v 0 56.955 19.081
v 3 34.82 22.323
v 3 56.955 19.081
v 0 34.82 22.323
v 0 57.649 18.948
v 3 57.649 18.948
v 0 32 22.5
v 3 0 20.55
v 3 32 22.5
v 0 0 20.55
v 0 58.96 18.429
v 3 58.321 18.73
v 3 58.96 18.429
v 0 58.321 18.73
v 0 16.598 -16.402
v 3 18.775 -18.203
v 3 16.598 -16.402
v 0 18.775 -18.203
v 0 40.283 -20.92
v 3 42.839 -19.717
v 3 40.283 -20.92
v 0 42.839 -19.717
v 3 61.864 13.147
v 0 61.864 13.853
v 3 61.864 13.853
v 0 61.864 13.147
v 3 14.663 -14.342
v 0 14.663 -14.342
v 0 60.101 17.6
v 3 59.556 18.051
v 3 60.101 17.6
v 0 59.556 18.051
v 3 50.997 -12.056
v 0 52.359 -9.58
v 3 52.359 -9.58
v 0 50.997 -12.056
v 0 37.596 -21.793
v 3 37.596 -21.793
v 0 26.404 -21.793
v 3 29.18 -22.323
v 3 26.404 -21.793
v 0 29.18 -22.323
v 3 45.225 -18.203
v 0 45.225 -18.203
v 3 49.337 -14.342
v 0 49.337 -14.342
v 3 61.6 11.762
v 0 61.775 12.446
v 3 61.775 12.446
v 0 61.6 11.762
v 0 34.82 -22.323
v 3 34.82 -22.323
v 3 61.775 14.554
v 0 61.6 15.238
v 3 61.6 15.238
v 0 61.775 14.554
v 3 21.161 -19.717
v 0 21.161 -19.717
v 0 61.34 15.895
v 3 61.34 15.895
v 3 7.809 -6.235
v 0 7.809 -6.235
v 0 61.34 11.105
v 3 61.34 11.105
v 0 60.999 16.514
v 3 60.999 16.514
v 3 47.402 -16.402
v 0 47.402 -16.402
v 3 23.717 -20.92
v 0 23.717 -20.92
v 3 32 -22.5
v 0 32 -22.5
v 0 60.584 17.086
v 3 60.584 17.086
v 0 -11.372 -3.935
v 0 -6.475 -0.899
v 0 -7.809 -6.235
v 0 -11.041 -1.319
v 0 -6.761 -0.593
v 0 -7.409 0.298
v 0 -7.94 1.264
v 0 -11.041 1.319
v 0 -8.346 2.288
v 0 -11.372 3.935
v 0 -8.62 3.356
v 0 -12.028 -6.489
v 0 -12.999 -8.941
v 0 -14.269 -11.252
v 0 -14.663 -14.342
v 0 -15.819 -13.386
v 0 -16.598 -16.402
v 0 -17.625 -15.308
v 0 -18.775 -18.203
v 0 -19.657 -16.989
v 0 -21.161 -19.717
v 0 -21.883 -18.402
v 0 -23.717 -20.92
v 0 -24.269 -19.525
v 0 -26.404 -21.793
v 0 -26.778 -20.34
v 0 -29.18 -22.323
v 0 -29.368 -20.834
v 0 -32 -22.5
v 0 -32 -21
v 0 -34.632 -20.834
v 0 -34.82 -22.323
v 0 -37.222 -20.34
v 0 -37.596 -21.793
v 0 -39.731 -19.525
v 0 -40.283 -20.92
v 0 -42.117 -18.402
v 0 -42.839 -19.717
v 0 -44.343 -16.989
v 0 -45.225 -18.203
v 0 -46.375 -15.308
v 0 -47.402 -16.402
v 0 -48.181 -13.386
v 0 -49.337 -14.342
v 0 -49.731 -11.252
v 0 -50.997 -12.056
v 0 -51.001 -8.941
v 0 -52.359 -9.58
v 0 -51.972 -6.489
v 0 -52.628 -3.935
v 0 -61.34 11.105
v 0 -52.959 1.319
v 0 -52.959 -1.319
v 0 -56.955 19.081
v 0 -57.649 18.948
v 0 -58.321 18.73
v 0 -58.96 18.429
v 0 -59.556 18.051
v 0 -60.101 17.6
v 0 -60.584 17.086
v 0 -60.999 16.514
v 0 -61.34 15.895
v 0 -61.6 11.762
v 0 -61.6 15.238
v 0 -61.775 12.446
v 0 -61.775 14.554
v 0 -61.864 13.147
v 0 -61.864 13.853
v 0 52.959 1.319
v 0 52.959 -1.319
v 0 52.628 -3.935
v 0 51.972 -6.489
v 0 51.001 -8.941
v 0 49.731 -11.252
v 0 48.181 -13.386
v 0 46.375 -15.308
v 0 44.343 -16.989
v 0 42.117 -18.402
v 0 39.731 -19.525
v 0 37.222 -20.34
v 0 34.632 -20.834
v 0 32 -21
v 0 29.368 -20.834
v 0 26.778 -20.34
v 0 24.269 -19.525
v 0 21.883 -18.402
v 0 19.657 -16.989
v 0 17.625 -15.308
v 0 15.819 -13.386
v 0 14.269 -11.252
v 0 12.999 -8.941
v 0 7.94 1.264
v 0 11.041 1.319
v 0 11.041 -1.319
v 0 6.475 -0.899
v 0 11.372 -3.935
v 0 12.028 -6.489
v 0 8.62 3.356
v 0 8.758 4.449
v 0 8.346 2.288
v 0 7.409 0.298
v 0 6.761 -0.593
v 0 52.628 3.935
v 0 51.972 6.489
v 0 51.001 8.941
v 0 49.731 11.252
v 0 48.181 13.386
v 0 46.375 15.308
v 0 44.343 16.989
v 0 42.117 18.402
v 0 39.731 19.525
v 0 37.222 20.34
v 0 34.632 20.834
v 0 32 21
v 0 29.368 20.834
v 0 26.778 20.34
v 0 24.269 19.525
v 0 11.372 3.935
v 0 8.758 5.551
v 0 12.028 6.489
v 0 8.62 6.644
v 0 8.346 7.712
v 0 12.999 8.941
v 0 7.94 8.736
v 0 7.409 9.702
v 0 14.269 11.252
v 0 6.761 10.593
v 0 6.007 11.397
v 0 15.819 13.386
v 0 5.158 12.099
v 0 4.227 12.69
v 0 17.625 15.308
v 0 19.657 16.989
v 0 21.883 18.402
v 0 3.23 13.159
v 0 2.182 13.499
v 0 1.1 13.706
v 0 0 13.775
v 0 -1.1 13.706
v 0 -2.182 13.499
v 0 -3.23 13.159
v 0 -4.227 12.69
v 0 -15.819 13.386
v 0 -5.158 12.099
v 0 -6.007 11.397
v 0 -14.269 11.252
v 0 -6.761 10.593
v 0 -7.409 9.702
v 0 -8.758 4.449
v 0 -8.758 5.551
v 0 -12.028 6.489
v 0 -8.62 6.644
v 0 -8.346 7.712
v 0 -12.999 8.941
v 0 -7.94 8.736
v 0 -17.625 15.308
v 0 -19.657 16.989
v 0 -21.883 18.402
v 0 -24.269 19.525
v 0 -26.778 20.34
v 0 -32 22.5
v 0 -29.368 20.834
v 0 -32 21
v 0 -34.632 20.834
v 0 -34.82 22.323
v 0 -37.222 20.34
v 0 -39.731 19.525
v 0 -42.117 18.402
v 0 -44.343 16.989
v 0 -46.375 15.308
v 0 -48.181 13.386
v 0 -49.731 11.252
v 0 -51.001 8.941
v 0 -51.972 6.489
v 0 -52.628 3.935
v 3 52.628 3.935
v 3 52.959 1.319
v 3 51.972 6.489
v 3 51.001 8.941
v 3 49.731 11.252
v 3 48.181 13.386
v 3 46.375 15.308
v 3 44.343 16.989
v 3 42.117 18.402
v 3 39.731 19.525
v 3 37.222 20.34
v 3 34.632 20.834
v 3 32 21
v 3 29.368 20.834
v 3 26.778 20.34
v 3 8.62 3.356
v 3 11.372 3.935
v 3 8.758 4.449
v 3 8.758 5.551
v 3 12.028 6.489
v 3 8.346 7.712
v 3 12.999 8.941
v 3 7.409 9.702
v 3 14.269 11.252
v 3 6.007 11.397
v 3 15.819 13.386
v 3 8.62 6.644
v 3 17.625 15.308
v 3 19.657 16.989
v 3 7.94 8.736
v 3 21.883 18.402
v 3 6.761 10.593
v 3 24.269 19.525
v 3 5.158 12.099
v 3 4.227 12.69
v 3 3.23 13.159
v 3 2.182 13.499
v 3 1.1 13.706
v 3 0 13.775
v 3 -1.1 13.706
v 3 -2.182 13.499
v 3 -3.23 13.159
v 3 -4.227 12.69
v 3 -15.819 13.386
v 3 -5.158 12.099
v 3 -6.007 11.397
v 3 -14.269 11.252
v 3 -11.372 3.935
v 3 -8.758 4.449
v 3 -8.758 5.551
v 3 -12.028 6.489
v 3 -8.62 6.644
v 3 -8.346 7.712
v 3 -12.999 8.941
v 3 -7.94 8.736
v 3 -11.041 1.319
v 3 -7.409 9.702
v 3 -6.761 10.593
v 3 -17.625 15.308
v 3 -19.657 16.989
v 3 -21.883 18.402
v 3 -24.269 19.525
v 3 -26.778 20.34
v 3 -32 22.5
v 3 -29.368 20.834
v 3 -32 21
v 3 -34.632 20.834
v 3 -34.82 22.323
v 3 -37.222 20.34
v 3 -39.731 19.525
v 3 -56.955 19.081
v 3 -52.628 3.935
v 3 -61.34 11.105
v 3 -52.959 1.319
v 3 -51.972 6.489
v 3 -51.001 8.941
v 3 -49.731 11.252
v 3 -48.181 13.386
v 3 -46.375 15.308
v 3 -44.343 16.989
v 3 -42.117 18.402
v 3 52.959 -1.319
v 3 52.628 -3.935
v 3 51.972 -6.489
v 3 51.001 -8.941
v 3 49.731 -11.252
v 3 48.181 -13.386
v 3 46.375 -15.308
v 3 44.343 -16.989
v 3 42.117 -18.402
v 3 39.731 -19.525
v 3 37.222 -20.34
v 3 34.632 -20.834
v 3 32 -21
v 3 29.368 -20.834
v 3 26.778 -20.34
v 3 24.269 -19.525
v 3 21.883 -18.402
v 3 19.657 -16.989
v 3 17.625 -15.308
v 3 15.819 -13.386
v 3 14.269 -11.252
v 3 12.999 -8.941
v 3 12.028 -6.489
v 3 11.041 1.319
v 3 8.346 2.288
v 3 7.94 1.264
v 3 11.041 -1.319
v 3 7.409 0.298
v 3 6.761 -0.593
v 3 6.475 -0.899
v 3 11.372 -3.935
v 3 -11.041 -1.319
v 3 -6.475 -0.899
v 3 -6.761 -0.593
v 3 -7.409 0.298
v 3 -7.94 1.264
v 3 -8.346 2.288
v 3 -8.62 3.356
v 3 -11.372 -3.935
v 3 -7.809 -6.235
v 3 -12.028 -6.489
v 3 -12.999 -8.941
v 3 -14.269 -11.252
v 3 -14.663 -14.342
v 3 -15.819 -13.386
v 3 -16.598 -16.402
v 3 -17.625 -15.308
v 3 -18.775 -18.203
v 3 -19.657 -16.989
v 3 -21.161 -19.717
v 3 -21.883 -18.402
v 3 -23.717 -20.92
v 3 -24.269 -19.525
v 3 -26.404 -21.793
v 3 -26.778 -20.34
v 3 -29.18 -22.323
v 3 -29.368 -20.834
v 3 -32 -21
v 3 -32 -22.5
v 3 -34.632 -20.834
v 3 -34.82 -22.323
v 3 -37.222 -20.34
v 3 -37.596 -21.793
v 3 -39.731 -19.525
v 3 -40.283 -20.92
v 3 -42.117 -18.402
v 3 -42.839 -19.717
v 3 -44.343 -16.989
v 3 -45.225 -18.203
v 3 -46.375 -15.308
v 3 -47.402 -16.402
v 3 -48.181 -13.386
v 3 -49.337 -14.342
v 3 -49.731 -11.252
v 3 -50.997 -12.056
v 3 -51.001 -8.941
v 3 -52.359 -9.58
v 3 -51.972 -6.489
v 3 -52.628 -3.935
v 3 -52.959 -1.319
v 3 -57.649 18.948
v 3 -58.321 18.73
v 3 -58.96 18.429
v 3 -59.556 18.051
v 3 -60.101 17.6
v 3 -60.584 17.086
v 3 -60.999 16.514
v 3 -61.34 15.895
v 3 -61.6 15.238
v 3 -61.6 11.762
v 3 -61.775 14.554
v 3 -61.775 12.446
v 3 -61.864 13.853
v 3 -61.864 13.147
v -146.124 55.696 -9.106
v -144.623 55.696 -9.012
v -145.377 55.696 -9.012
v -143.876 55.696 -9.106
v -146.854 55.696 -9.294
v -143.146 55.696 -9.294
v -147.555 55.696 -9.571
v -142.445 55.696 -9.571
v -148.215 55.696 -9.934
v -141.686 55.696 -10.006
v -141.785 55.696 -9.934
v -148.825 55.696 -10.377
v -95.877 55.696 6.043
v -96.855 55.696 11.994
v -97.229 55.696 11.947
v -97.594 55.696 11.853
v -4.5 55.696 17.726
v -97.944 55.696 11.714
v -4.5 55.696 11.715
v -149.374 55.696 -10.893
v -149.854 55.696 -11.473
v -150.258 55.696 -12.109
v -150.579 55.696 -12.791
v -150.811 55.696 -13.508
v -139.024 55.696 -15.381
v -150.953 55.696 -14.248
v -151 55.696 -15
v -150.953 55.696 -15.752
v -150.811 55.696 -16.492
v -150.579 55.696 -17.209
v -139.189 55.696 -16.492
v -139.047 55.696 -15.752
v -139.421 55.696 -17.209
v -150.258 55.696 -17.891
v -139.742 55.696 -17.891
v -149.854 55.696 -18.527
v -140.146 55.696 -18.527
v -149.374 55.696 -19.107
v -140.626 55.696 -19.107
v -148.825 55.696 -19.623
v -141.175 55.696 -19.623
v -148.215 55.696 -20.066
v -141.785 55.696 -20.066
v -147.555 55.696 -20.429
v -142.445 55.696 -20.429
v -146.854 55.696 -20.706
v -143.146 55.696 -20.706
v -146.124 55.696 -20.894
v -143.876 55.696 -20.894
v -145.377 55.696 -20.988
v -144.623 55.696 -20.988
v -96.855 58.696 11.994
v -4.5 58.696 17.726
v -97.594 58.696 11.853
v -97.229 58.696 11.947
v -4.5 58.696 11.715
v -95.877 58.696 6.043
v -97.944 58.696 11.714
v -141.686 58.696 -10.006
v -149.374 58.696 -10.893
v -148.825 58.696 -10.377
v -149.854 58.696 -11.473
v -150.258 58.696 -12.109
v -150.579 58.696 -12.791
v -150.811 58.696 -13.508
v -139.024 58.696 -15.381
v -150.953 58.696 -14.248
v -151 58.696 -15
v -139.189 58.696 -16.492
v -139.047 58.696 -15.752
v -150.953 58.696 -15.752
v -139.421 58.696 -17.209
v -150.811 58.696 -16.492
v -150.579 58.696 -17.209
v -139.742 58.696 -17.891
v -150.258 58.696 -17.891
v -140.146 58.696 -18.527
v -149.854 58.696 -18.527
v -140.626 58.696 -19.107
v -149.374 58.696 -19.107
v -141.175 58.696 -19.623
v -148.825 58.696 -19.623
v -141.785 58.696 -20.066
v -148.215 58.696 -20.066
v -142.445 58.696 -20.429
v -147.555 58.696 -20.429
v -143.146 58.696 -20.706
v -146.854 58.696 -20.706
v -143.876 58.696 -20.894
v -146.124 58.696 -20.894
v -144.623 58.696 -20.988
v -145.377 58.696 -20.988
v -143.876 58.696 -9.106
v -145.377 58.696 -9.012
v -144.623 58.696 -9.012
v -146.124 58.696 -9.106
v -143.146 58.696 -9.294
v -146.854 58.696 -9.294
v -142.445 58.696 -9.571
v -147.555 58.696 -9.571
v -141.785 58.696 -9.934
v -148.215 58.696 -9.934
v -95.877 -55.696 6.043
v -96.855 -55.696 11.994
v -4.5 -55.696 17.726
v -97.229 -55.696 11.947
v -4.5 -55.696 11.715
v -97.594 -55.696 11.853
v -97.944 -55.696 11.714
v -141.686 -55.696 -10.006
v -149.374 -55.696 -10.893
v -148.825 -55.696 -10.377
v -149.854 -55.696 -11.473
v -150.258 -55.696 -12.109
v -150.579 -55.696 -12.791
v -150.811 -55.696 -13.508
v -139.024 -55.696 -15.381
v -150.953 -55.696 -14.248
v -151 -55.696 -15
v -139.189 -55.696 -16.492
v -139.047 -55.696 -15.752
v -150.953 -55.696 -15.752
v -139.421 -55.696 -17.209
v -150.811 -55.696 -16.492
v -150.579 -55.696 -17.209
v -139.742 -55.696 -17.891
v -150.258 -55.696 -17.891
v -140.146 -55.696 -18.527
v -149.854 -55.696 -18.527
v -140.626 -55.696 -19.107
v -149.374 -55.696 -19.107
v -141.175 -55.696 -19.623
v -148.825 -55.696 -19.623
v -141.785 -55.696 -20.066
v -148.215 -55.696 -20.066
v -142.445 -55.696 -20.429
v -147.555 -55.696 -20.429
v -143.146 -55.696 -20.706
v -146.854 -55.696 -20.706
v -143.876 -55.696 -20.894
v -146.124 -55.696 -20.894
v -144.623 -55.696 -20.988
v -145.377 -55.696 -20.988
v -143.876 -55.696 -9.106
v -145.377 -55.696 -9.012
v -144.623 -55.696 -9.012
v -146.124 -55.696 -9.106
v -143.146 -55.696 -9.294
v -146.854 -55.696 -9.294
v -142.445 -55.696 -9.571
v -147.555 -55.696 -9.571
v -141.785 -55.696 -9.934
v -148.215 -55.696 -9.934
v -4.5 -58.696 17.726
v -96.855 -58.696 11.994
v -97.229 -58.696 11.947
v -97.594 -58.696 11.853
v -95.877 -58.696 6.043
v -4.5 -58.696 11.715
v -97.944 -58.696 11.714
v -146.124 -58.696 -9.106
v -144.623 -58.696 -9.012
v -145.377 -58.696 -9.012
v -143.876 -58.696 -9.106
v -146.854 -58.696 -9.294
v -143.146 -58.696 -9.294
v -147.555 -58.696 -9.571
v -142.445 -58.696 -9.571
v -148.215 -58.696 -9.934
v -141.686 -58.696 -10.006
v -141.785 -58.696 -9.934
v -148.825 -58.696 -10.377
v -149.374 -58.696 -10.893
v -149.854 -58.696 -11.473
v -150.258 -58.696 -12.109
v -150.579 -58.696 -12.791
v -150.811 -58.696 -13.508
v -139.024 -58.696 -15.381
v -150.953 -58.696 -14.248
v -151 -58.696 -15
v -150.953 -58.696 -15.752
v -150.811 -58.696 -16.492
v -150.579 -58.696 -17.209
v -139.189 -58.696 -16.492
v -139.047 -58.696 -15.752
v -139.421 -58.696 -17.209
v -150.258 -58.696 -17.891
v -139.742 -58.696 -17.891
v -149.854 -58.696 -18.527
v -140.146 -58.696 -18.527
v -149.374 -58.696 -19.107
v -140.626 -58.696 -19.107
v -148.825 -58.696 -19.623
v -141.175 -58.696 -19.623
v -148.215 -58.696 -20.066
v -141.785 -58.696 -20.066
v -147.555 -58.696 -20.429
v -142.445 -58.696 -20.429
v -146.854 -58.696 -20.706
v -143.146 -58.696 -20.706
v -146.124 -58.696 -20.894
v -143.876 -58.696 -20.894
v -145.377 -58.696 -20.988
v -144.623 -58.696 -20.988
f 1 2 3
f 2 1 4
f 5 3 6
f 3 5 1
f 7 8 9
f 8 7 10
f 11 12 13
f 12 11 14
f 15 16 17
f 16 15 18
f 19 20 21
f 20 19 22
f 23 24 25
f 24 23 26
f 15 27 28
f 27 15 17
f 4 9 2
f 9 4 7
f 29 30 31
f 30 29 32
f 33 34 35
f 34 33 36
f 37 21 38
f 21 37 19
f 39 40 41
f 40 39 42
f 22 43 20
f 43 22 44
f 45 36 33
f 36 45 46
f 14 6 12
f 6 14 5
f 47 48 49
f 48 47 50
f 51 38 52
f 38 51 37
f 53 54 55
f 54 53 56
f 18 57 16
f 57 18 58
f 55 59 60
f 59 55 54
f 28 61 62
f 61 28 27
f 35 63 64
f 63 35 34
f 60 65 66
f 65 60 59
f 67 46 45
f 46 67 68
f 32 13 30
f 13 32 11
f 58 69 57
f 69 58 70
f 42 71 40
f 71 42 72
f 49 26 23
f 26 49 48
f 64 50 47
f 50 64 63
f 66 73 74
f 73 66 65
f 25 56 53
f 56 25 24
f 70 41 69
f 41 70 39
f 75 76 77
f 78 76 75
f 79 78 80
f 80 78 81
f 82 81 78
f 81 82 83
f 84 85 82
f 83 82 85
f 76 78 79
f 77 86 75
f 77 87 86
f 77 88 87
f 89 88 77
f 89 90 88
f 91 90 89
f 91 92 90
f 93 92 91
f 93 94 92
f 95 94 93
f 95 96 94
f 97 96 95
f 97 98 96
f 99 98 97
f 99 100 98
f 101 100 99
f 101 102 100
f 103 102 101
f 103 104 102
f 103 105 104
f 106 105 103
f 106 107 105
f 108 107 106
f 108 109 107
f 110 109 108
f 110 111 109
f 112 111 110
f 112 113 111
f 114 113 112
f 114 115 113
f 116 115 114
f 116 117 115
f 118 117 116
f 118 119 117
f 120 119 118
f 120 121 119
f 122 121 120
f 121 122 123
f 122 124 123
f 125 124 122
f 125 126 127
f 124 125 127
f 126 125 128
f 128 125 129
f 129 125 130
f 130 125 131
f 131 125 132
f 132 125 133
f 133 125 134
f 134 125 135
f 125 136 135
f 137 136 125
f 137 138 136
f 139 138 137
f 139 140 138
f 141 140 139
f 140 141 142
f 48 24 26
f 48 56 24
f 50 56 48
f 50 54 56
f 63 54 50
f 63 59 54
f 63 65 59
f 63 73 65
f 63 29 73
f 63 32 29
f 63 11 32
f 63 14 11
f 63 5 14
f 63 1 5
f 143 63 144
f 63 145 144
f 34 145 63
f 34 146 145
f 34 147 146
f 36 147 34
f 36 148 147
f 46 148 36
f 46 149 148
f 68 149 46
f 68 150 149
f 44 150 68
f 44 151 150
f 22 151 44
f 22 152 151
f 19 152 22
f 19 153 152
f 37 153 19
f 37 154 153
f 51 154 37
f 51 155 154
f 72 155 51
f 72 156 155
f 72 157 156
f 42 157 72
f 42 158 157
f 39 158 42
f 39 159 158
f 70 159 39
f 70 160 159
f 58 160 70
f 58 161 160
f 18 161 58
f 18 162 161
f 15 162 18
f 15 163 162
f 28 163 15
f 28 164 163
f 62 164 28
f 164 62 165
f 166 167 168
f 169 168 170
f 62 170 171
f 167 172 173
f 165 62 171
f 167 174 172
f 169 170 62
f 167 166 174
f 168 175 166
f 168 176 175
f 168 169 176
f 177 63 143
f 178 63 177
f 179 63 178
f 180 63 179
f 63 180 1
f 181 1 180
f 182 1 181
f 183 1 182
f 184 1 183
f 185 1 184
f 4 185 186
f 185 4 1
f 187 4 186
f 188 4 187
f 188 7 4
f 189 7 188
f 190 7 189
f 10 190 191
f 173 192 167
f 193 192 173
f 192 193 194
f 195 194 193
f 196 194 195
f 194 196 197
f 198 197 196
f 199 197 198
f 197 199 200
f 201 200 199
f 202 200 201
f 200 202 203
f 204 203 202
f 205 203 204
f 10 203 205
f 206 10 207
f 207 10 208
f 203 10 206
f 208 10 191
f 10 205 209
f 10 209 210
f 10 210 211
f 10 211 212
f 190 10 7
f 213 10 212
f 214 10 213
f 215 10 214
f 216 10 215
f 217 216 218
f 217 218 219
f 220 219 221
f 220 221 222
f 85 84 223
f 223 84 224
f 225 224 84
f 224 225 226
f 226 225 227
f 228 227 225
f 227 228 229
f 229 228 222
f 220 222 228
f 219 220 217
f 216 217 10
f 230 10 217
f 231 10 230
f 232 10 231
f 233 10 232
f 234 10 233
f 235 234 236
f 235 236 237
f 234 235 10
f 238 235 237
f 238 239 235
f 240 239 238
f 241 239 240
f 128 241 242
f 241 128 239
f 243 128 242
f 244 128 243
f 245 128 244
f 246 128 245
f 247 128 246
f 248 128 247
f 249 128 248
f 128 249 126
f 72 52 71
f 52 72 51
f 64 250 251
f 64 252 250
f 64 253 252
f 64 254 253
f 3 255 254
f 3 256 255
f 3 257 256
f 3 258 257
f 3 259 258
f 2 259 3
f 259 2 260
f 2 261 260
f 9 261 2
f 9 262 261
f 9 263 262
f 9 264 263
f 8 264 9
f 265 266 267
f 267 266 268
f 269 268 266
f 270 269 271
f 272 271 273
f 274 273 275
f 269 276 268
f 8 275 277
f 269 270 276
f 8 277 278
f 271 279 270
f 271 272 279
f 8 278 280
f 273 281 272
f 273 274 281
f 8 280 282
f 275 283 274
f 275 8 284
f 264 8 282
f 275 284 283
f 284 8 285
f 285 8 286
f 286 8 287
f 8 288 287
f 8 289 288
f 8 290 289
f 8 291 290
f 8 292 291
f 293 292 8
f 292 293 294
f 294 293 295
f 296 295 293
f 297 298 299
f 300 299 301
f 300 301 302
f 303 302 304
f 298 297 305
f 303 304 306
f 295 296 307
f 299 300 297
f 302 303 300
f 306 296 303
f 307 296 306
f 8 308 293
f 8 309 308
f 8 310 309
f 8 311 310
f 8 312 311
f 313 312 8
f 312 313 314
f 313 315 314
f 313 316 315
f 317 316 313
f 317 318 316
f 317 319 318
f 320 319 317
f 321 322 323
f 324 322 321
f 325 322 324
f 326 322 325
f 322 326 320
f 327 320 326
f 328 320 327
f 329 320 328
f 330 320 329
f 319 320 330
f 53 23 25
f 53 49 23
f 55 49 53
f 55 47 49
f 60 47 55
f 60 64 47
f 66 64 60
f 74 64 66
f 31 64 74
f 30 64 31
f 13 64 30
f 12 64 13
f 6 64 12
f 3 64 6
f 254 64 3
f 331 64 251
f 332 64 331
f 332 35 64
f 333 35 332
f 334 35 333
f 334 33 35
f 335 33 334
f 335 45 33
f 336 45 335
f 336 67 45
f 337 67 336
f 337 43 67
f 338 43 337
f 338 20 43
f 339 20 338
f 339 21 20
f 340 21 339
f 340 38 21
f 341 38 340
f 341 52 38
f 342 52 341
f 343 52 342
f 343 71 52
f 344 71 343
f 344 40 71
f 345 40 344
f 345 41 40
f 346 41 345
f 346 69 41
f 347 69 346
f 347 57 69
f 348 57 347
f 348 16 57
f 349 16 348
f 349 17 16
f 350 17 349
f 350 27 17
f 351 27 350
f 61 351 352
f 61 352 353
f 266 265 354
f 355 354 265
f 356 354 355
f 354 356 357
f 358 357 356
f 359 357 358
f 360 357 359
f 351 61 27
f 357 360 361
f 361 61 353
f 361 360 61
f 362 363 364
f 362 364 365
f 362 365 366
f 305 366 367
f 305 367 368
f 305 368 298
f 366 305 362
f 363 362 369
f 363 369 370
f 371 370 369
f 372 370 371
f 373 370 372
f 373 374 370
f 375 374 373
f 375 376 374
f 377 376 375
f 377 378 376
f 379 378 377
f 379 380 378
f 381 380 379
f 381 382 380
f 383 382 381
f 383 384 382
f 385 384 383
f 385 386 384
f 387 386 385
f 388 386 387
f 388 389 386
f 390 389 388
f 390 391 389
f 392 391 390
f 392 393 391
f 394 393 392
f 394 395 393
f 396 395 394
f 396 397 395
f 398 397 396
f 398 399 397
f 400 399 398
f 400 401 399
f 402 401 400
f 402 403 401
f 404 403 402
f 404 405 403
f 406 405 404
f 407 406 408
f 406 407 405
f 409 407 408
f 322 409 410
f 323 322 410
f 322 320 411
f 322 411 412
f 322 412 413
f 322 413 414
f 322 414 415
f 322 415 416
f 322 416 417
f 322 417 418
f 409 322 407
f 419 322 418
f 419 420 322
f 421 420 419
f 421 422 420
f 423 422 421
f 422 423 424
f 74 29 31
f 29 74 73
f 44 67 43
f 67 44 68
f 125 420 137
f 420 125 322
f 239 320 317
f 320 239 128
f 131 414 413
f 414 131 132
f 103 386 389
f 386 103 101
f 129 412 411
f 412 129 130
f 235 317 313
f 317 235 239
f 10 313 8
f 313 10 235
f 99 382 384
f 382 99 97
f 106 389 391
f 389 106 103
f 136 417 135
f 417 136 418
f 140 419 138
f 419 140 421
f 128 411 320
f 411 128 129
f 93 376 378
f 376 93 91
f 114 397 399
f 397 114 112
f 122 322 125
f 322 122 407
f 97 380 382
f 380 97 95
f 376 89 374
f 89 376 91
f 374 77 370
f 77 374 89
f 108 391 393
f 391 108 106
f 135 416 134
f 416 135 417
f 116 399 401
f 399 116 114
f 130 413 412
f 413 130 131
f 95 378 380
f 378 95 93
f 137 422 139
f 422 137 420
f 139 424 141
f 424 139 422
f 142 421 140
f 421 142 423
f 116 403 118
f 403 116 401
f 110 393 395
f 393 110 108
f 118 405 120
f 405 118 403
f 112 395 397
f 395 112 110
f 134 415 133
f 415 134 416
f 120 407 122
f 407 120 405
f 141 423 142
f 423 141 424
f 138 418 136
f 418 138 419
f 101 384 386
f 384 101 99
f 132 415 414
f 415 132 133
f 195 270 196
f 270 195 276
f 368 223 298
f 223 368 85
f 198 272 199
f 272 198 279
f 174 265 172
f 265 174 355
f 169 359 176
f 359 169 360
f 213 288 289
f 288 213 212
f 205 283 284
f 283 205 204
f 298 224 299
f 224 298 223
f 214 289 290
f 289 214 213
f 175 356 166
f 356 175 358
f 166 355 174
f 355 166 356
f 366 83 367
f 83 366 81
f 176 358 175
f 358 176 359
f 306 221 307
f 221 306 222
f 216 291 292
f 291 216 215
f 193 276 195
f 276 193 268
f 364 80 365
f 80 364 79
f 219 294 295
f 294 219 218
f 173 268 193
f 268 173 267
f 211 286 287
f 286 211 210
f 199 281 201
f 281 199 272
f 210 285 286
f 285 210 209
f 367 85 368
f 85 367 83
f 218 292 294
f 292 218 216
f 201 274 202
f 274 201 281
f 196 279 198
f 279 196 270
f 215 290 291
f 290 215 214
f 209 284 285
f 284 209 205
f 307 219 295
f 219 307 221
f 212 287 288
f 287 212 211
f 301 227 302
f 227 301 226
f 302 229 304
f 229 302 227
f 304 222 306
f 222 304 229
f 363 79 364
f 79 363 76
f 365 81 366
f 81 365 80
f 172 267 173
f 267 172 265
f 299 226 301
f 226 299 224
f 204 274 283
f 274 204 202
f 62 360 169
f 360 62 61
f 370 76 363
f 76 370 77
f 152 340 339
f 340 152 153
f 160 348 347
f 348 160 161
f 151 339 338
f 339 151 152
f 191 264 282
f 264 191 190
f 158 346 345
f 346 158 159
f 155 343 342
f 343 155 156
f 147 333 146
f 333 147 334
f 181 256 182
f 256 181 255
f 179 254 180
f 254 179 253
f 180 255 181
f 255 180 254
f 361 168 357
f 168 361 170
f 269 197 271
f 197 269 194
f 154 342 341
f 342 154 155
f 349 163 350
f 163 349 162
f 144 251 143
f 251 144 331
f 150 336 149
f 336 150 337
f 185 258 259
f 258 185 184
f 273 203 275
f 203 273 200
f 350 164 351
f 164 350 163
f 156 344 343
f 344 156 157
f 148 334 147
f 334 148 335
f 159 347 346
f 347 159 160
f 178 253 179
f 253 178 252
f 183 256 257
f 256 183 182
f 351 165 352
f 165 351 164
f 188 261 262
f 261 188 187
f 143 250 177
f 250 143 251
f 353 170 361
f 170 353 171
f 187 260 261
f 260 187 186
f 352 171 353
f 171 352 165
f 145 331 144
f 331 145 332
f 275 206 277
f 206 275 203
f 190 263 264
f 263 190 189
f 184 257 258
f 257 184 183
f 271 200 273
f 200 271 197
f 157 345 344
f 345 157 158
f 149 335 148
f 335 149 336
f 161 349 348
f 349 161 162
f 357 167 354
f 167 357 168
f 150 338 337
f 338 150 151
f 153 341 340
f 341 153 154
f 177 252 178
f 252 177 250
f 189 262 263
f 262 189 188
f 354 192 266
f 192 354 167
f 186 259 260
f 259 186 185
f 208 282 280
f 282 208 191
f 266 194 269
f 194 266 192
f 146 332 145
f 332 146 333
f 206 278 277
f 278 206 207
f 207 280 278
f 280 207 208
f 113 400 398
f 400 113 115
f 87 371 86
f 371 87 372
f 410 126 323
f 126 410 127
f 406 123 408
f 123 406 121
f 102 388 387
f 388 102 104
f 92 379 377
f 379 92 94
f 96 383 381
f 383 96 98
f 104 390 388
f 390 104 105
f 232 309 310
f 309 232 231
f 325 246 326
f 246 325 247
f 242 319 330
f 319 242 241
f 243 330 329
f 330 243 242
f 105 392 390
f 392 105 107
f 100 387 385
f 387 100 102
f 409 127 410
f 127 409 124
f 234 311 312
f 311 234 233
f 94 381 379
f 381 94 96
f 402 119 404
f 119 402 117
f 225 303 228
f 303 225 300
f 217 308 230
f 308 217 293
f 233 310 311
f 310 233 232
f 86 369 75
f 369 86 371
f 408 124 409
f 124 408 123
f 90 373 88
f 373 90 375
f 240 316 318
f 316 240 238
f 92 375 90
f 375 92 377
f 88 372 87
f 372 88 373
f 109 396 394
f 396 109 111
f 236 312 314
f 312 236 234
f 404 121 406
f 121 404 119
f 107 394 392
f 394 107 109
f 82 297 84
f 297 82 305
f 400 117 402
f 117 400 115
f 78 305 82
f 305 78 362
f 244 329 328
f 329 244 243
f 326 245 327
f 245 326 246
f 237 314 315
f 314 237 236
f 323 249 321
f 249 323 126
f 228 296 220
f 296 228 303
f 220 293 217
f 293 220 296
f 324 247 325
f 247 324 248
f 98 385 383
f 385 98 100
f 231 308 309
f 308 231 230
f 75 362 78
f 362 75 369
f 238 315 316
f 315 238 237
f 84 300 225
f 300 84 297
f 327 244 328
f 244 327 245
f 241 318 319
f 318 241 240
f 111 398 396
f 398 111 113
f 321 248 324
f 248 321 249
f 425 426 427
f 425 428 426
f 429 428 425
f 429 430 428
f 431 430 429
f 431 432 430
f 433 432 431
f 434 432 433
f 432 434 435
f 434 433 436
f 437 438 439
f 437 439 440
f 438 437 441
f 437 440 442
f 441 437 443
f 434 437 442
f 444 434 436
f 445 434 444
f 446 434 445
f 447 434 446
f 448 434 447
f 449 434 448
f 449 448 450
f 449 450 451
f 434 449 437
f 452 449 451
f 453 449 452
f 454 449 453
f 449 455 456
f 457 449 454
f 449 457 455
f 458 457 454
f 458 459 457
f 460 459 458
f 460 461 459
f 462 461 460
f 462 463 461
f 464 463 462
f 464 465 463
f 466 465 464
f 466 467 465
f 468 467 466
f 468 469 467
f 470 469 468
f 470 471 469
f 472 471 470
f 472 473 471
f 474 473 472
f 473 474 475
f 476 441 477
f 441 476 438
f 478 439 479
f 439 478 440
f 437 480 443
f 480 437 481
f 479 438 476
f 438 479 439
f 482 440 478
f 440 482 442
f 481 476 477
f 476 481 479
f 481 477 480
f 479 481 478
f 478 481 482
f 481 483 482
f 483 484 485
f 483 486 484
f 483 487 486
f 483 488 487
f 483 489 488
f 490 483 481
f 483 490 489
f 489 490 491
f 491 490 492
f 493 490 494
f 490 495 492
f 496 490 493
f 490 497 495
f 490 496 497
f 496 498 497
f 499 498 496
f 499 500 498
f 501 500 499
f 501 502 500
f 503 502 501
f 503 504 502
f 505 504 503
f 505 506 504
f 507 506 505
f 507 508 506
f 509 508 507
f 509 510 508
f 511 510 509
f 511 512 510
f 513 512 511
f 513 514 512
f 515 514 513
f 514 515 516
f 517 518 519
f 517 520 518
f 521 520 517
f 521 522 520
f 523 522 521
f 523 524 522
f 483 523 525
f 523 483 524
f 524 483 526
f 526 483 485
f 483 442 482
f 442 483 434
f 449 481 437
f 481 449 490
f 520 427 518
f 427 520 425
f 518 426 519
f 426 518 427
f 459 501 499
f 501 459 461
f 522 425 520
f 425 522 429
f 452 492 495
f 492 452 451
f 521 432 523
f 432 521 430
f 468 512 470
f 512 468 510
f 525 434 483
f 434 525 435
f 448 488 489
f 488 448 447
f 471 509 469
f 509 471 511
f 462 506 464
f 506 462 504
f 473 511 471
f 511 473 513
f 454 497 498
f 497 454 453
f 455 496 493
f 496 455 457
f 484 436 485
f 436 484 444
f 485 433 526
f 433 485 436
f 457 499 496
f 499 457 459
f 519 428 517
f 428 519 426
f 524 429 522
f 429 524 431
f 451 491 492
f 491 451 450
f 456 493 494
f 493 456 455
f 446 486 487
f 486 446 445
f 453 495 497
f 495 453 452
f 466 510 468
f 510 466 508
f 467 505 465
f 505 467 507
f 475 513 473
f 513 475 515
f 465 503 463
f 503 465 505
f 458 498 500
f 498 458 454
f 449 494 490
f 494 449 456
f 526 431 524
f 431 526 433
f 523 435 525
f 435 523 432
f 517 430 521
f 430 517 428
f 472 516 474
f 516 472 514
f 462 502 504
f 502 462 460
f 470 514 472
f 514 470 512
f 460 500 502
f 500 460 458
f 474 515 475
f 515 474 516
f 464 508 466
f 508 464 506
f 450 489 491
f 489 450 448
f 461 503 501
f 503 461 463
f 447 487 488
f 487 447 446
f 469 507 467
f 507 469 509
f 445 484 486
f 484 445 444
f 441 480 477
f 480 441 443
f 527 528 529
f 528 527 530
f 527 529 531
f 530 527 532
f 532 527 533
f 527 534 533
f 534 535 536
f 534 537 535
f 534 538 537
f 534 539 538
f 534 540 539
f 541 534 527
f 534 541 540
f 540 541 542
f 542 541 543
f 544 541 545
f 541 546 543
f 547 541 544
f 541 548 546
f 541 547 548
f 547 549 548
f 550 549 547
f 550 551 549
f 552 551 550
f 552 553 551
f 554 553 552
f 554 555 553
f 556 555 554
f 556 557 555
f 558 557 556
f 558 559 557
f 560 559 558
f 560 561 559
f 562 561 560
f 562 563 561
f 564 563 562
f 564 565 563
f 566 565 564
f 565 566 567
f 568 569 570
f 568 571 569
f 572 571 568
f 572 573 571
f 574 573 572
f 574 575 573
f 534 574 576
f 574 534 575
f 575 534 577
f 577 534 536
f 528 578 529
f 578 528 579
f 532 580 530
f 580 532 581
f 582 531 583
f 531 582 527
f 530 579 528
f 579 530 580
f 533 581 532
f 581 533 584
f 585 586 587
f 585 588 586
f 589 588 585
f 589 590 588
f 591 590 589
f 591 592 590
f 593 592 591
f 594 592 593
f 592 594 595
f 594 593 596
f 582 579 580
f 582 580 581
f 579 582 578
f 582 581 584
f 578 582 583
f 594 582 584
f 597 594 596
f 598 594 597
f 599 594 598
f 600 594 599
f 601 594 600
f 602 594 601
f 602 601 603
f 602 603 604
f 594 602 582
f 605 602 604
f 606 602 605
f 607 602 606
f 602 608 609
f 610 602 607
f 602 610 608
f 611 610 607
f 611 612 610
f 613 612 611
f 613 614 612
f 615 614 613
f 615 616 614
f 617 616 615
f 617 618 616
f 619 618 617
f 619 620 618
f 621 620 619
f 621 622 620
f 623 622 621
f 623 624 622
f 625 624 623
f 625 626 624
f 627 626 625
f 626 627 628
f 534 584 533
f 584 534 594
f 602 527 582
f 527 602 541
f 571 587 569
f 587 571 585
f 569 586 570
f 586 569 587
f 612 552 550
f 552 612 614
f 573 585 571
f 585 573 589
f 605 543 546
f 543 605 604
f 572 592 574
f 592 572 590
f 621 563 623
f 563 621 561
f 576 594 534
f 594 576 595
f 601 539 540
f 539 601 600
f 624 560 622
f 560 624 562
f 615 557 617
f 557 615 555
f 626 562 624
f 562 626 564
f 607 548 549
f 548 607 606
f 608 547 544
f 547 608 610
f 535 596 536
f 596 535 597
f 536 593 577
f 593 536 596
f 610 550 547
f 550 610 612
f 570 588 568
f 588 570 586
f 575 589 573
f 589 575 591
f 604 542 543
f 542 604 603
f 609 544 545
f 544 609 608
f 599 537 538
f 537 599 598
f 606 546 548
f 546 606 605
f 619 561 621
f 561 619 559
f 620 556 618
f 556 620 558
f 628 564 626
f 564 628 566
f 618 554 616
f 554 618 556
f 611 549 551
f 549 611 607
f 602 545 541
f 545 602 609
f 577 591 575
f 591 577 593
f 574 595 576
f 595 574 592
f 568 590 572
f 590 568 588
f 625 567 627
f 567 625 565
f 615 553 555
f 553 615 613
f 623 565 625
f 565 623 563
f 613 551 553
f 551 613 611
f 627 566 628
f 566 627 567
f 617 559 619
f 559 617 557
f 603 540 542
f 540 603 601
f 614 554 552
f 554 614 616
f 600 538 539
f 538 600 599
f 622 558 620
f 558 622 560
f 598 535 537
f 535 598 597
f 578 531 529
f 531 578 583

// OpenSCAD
// How wide should your glasses be?
width=135; // [125:150]

// How wide should the bridge be?
bridge=10; // [10:25]

// How long should the arms be?
arm=145; // [125:160]

// How thick should the frame be?
thickness=3; // [2:5]


$fn = 50;
difference(){
difference(){
minkowski(){

difference(){
union(){
difference(){

hull(){
translate([0,width/5+bridge/2,0])
rotate([0,90,0])
cylinder(thickness, d=width/3);

translate([0,width/2-width/12,width/10])
rotate([0,90,0])
cylinder(thickness, d=width/12);

translate([0,0,3])
rotate([0,0,0])
cube([thickness,bridge/2,width*.13]);}}

difference(){
mirror([0,1,0])
hull(){
translate([0,width/5+bridge/2,0])
rotate([0,90,0])
cylinder(thickness, d=width/3);

translate([0,width/2-width/12,width/10])
rotate([0,90,0])
cylinder(thickness, d=width/12);

translate([0,0,3])
rotate([0,0,0])
cube([thickness,bridge/2,width*.13]);}}}


union(){
translate([0,0,bridge/2])
rotate([0,90,0])
cylinder(thickness*3, d=width*.13, center=true);

translate([0,0,bridge/2])
rotate([0,180,0])
linear_extrude(height=bridge*2, scale=2)
square(bridge, center=true);}}

*sphere([thickness/3]);}

translate([0,width/5+bridge/2,0])
rotate([0,90,0])
cylinder(thickness*3, d=width/3-thickness, center=true);}

translate([0,-width/5-bridge/2,0])
rotate([0,90,0])
cylinder(thickness*3, d=width/3-thickness, center=true);}

difference(){
union(){
hull(){
translate([0,width/2.3,width/9])
rotate([90,0,0])
cylinder(thickness, d=thickness*2);

translate([-arm*(2/3),width/2.3,width/15])
rotate([90,0,0])
cylinder(thickness, d=thickness*2);}

hull(){
translate([-arm*(2/3),width/2.3,width/15])
rotate([90,0,0])
cylinder(thickness, d=thickness*2);

translate([-arm,width/2.3,-width/9])
rotate([90,0,0])
cylinder(thickness, d=thickness*2);}

translate([-arm,width/2.3,-width/9])
rotate([90,0,0])
cylinder(thickness, d=thickness*4);}

translate([0,width/2.3,width/9])
rotate([0,0,0])
cube(thickness*3, center=true);}



mirror([0,1,0])
difference(){
union(){
hull(){
translate([0,width/2.3,width/9])
rotate([90,0,0])
cylinder(thickness, d=thickness*2);

translate([-arm*(2/3),width/2.3,width/15])
rotate([90,0,0])
cylinder(thickness, d=thickness*2);}

hull(){
translate([-arm*(2/3),width/2.3,width/15])
rotate([90,0,0])
cylinder(thickness, d=thickness*2);

translate([-arm,width/2.3,-width/9])
rotate([90,0,0])
cylinder(thickness, d=thickness*2);}

translate([-arm,width/2.3,-width/9])
rotate([90,0,0])
cylinder(thickness, d=thickness*4);}

translate([0,width/2.3,width/9])
rotate([0,0,0])
cube(thickness*3, center=true);}



translate([0,0,0])
rotate([0,0,0])
cube(0,0,0);

translate([0,0,0])
rotate([0,0,0])
cylinder(0, d=0);

translate([0,0,0])
rotate([0,0,0])
sphere(0);
